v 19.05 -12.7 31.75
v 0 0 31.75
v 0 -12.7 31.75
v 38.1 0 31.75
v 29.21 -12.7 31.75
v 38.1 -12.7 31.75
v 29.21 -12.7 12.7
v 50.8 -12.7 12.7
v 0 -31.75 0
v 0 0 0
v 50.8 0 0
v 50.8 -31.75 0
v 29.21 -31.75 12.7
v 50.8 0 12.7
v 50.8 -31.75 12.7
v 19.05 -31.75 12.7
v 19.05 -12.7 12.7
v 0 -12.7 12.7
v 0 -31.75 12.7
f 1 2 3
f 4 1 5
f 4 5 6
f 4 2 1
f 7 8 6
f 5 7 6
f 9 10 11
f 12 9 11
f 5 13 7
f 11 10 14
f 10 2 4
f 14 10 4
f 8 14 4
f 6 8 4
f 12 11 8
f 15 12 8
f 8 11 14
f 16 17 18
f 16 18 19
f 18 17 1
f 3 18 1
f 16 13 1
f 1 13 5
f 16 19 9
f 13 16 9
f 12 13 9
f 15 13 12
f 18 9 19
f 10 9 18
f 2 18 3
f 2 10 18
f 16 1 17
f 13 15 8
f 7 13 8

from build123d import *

# Parameters (mm, degrees)
F0_W     = 50.8
F0_H     = 31.75
F1_DEPTH = 31.75
F2_W     = 19.05
F2_H     = 19.05
F3_DEPTH = 19.05
F4_W     = 19.05
F4_H     = 19.05
F5_DEPTH = 21.59
F7_DEPTH = 25.4
F9_DEPTH = 25.4


with BuildPart() as f1:
    # F0 (on Front) → F1 (new body)
    with BuildSketch(Plane.XZ):
        with Locations((25.4, 15.875)):
            Rectangle(F0_W, F0_H)
    extrude(amount=F1_DEPTH)

    # F2 (on face) → F3 (cut)
    with BuildSketch(Plane(origin=(0, 0, 0), x_dir=(0, -1, 0), z_dir=(-1, 0, 0))):
        with Locations((22.225, 22.225)):
            Rectangle(F2_W, F2_H)
    extrude(amount=-F3_DEPTH, mode=Mode.SUBTRACT)

    # F4 (on face) → F5 (cut)
    with BuildSketch(Plane.YZ.offset(50.8)):
        with Locations((-22.225, 22.225)):
            Rectangle(F4_W, F4_H)
    extrude(amount=-F5_DEPTH, mode=Mode.SUBTRACT)

    # F6 (on face) → F7 (cut)
    with BuildSketch(Plane.YZ.offset(29.21)):
        Polygon((-31.75, 31.75), (-31.75, 12.7), (-12.7, 31.75), align=None)
    extrude(amount=-F7_DEPTH, mode=Mode.SUBTRACT)

    # F8 (on face) → F9 (cut)
    with BuildSketch(Plane(origin=(0, 0, 0), x_dir=(-1, 0, 0), z_dir=(0, 1, 0))):
        Polygon((-38.1, 31.75), (-50.8, 31.75), (-50.8, 12.7), align=None)
    extrude(amount=-F9_DEPTH, mode=Mode.SUBTRACT)


solid = f1.part
